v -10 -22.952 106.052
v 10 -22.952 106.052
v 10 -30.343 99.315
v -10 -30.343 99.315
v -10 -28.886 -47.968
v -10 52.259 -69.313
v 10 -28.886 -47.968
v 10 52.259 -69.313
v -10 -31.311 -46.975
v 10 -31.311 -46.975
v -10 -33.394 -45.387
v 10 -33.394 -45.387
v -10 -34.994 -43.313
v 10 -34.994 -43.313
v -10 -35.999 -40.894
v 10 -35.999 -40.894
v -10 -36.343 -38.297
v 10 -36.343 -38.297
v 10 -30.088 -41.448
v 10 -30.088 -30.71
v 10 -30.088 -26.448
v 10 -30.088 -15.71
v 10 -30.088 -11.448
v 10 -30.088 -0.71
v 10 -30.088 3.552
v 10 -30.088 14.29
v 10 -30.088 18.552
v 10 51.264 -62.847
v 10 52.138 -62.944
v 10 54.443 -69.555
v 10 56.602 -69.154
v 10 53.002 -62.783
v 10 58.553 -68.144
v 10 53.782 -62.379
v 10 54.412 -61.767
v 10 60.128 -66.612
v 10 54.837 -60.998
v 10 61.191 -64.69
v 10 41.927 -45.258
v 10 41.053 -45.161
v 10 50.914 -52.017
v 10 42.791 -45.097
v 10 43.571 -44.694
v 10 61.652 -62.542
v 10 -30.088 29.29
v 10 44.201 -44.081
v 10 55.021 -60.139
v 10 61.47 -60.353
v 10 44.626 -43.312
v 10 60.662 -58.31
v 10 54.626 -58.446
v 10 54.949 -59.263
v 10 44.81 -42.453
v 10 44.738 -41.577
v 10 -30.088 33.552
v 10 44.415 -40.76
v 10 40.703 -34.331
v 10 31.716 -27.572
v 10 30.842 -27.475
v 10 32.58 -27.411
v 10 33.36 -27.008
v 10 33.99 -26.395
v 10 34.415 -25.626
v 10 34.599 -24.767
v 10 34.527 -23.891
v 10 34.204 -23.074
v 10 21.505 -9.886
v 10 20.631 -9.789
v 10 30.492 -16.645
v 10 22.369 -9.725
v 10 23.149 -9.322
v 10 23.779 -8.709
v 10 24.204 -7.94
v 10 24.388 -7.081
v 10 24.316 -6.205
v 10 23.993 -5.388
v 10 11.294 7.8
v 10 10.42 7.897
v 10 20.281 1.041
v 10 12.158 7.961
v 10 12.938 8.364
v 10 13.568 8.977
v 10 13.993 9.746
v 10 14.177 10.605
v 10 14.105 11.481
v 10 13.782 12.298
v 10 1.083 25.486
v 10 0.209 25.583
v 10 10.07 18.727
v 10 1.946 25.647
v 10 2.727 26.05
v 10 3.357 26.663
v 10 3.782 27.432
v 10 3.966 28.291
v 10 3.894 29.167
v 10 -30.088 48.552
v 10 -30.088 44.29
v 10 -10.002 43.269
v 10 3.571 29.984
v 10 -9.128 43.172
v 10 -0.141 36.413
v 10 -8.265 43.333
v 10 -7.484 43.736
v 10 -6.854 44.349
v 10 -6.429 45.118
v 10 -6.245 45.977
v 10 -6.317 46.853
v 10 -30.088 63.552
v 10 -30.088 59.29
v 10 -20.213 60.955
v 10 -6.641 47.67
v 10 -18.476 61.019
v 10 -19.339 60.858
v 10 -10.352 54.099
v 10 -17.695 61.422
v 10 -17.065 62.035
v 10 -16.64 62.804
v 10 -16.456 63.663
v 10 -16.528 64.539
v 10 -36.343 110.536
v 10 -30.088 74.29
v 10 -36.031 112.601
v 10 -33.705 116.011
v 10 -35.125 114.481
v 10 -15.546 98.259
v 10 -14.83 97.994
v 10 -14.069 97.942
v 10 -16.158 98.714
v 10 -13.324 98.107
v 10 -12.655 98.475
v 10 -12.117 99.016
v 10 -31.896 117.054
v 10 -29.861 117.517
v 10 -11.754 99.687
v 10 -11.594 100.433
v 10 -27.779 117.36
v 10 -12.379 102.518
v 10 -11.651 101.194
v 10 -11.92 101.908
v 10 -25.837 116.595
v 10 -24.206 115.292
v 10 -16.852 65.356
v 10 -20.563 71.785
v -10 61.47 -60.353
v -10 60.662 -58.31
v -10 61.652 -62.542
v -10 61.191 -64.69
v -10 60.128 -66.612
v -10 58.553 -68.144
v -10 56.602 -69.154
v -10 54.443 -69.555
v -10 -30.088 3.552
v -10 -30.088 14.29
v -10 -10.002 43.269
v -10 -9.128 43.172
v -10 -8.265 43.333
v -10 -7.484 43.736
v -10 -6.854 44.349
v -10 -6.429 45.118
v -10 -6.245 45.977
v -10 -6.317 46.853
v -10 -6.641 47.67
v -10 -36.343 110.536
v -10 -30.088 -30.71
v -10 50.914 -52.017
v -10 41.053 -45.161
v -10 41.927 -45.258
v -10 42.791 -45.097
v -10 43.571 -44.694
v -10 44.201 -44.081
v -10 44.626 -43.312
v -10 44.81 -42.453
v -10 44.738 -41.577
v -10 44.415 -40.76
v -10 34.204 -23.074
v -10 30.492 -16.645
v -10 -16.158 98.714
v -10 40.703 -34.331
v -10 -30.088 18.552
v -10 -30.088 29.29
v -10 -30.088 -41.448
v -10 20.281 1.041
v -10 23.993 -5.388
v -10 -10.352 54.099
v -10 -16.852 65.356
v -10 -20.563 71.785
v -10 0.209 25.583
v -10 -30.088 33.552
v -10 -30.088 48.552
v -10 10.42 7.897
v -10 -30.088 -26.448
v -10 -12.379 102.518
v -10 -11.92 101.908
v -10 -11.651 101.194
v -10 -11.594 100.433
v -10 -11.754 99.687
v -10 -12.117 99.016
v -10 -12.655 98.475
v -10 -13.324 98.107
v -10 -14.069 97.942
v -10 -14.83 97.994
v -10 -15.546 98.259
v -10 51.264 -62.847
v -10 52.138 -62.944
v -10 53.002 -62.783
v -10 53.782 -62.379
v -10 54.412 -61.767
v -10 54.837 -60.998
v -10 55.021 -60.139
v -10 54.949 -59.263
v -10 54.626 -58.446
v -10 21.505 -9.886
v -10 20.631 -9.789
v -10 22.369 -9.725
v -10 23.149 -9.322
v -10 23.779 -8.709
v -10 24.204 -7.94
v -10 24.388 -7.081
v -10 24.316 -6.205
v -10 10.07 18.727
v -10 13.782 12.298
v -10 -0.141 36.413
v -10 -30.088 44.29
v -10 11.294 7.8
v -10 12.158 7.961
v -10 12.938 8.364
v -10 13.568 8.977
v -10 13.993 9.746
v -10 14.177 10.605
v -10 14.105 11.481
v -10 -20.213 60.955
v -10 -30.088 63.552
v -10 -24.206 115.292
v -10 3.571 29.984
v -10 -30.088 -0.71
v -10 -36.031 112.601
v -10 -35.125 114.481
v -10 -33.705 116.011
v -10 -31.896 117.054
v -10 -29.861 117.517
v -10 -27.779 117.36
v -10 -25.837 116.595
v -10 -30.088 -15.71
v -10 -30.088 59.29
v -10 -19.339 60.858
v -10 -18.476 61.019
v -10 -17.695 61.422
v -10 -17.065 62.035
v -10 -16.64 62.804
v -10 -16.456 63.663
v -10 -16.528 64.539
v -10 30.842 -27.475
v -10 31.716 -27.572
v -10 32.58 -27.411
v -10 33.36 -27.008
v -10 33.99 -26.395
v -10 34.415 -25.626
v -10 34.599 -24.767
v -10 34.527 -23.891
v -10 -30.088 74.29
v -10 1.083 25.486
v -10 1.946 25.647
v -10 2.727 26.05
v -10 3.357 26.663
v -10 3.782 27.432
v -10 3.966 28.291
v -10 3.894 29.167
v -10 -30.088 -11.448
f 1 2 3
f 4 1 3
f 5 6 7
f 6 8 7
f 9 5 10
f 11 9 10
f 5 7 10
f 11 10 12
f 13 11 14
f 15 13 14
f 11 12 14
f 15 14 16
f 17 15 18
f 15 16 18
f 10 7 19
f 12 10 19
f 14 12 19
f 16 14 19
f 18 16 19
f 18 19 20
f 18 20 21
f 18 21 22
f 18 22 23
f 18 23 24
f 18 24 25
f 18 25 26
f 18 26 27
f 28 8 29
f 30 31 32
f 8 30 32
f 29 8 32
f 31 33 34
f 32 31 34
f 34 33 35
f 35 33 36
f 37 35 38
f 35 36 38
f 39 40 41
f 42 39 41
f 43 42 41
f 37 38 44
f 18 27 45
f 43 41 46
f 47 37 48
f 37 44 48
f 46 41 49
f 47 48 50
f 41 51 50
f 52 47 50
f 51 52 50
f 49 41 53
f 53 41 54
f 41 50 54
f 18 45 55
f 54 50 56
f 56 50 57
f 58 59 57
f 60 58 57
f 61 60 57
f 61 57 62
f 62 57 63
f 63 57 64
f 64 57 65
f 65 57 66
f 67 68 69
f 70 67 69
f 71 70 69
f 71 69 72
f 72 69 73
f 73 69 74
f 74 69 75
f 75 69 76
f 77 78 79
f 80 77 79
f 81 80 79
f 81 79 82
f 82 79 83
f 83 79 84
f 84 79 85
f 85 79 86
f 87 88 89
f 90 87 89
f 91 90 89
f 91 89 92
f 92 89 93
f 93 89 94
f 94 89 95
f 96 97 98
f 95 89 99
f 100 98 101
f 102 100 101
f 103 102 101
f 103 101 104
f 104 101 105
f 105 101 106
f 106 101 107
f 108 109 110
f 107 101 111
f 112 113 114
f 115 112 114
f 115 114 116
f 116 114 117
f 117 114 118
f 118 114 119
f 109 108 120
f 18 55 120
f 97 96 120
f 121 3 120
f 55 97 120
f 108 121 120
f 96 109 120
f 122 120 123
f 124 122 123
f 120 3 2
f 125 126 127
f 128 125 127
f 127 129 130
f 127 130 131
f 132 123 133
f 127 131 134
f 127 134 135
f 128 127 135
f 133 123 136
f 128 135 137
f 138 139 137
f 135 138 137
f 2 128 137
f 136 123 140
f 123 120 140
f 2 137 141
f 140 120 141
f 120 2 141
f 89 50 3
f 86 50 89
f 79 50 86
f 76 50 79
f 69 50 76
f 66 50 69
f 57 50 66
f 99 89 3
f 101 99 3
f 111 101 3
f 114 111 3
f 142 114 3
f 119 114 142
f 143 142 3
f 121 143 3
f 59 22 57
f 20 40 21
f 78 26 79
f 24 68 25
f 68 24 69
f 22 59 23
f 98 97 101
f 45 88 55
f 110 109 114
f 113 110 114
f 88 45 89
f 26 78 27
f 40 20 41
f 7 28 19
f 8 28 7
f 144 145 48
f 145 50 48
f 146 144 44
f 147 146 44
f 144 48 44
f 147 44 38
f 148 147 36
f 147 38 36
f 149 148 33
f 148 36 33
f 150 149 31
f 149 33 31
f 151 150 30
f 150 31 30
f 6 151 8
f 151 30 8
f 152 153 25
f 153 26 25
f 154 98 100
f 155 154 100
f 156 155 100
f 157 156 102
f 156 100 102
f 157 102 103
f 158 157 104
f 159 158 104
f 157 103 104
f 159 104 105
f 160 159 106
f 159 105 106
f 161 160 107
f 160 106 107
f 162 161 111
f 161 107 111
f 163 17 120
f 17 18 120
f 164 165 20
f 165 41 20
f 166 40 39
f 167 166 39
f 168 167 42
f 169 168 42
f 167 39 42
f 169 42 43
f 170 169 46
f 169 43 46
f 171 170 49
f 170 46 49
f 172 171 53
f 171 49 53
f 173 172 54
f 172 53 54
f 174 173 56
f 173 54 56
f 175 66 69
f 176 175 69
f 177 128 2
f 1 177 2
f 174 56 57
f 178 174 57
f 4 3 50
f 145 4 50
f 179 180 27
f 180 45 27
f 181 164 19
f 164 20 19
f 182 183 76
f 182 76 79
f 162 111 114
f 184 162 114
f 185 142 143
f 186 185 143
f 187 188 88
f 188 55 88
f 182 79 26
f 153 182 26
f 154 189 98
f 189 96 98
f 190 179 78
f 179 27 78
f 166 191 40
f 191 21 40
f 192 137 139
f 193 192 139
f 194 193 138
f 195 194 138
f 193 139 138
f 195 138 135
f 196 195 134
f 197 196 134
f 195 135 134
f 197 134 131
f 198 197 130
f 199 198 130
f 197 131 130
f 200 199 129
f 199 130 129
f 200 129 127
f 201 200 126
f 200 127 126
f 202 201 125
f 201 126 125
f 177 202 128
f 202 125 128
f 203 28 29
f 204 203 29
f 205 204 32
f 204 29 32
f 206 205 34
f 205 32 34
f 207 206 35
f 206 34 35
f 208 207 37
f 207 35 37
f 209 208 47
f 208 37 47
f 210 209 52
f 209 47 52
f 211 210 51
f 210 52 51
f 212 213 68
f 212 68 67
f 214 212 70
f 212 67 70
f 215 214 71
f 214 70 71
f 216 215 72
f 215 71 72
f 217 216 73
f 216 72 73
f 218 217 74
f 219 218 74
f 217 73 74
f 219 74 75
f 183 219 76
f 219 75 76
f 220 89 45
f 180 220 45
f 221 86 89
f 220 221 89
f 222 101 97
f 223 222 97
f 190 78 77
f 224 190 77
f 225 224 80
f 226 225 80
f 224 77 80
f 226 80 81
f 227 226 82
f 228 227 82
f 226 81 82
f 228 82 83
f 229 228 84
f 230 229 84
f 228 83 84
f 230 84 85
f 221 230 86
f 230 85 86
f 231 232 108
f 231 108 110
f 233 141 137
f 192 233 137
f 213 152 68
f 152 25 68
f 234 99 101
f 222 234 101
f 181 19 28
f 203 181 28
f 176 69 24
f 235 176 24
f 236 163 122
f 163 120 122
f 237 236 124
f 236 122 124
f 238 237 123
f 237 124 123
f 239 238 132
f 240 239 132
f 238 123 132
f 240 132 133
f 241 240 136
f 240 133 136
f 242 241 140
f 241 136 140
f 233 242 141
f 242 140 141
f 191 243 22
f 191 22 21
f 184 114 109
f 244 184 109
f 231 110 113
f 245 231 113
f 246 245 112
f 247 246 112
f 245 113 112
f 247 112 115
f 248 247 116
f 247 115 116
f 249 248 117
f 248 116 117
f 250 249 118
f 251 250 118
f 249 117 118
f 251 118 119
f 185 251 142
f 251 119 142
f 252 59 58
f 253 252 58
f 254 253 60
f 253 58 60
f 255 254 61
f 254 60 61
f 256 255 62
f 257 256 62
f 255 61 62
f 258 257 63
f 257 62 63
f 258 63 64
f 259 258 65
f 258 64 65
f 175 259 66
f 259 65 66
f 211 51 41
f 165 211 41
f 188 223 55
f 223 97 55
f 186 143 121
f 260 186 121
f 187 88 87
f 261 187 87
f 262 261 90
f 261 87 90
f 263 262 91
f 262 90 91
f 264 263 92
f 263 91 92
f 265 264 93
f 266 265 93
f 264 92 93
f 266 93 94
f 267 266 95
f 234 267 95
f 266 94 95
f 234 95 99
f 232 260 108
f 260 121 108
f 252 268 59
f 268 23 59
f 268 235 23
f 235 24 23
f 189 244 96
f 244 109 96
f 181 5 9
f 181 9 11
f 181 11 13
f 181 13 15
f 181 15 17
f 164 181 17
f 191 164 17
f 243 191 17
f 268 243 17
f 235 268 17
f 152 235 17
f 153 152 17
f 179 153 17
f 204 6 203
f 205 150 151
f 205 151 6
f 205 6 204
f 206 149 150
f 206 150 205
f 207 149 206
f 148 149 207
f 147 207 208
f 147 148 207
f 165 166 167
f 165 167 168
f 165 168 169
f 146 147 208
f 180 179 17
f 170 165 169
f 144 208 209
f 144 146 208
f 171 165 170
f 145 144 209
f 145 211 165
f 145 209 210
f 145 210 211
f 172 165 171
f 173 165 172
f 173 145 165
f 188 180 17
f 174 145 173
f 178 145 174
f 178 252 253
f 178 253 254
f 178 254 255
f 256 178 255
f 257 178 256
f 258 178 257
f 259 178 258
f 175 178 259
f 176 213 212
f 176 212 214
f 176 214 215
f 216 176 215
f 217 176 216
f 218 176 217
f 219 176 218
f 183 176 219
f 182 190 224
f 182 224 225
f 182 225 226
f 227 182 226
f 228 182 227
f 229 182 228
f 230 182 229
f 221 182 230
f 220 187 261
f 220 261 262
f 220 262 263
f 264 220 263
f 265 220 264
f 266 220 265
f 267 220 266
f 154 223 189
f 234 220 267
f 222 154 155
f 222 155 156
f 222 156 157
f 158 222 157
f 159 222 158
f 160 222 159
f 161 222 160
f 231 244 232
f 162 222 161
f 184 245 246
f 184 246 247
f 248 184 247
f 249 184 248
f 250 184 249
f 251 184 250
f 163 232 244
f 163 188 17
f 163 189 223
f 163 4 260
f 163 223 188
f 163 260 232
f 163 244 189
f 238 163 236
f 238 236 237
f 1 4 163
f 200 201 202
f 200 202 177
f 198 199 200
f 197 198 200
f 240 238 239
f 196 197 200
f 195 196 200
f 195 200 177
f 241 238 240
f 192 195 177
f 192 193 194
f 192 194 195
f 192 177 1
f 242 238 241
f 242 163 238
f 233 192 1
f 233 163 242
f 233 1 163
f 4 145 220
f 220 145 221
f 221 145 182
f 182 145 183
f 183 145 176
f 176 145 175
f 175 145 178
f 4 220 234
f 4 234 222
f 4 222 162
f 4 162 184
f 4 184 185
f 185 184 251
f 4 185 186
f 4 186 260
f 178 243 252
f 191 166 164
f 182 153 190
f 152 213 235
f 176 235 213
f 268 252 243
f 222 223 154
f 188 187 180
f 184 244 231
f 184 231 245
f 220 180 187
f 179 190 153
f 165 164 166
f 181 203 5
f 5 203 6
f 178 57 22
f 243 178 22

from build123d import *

# Parameters (mm, degrees)
BOSS_EXTRUDE1_DEPTH = 10


with BuildPart() as part:
    # Sketch1 → Boss-Extrude1 (new, symmetric)
    with BuildSketch(Plane(origin=(0, 0, 0), x_dir=(0, 0, -1), z_dir=(1, 0, 0))):
        with BuildLine():
            Line((-99.315402363, -30.342537444), (58.309854952, 60.662447298))
            ThreePointArc((58.309854952, 60.662447298), (66.611935212, 60.127841079), (69.313108369, 52.259295849))
            Line((69.313108369, 52.259295849), (47.967793309, -28.886485338))
            ThreePointArc((47.967793309, -28.886485338), (44.402545097, -34.262116945), (38.296788753, -36.342537444))
            Line((38.296788753, -36.342537444), (-110.536380347, -36.342537444))
            ThreePointArc((-110.536380347, -36.342537444), (-117.053891299, -31.896368093), (-115.29198584, -24.205980582))
            Line((-115.29198584, -24.205980582), (-102.51761164, -12.379014435))
            ThreePointArc((-102.51761164, -12.379014435), (-98.726134685, -12.366723669), (-98.713843919, -16.158200625))
            Line((-98.713843919, -16.158200625), (-106.051782293, -22.951922758))
            Line((-106.051782293, -22.951922758), (-99.315402363, -30.342537444))
        make_face()
        with BuildLine():
            Line((52.017451593, 50.914073792), (30.709901091, -30.088142654))
            Line((30.709901091, -30.088142654), (41.447586102, -30.088142654))
            Line((41.447586102, -30.088142654), (62.847268014, 51.26431811))
            ThreePointArc((62.847268014, 51.26431811), (61.766798752, 54.411736202), (58.445966648, 54.62557869))
            Line((58.445966648, 54.62557869), (52.017451593, 50.914073792))
        make_face(mode=Mode.SUBTRACT)
        with BuildLine():
            Line((15.709901091, -30.088142654), (26.447586102, -30.088142654))
            Line((26.447586102, -30.088142654), (45.161270866, 41.053302896))
            ThreePointArc((45.161270866, 41.053302896), (44.080801604, 44.200720988), (40.7599695, 44.414563475))
            Line((40.7599695, 44.414563475), (34.331454445, 40.703058578))
            Line((34.331454445, 40.703058578), (15.709901091, -30.088142654))
        make_face(mode=Mode.SUBTRACT)
        with BuildLine():
            Line((0.709901092, -30.088142654), (11.447586102, -30.088142654))
            Line((11.447586102, -30.088142654), (27.475273718, 30.842287682))
            ThreePointArc((27.475273718, 30.842287682), (26.394804456, 33.989705774), (23.073972352, 34.203548261))
            Line((23.073972352, 34.203548261), (16.645457297, 30.492043364))
            Line((16.645457297, 30.492043364), (0.709901092, -30.088142654))
        make_face(mode=Mode.SUBTRACT)
        with BuildLine():
            Line((-14.290098908, -30.088142654), (-3.552413898, -30.088142654))
            Line((-3.552413898, -30.088142654), (9.789276571, 20.631272467))
            ThreePointArc((9.789276571, 20.631272467), (8.708807308, 23.778690559), (5.387975204, 23.992533047))
            Line((5.387975204, 23.992533047), (-1.040539851, 20.28102815))
            Line((-1.040539851, 20.28102815), (-14.290098908, -30.088142654))
        make_face(mode=Mode.SUBTRACT)
        with BuildLine():
            Line((-29.290098908, -30.088142654), (-18.552413898, -30.088142654))
            Line((-18.552413898, -30.088142654), (-7.896720577, 10.420257253))
            ThreePointArc((-7.896720577, 10.420257253), (-8.97718984, 13.567675345), (-12.298021944, 13.781517833))
            Line((-12.298021944, 13.781517833), (-18.726536999, 10.070012936))
            Line((-18.726536999, 10.070012936), (-29.290098908, -30.088142654))
        make_face(mode=Mode.SUBTRACT)
        with BuildLine():
            Line((-44.290098908, -30.088142654), (-33.552413898, -30.088142654))
            Line((-33.552413898, -30.088142654), (-25.582717725, 0.209242039))
            ThreePointArc((-25.582717725, 0.209242039), (-26.663186988, 3.356660131), (-29.984019092, 3.570502619))
            Line((-29.984019092, 3.570502619), (-36.412534146, -0.141002279))
            Line((-36.412534146, -0.141002279), (-44.290098908, -30.088142654))
        make_face(mode=Mode.SUBTRACT)
        with BuildLine():
            Line((-59.290098908, -30.088142654), (-48.552413898, -30.088142654))
            Line((-48.552413898, -30.088142654), (-43.268714873, -10.001773175))
            ThreePointArc((-43.268714873, -10.001773175), (-44.349184136, -6.854355083), (-47.67001624, -6.640512596))
            Line((-47.67001624, -6.640512596), (-54.098531294, -10.352017493))
            Line((-54.098531294, -10.352017493), (-59.290098908, -30.088142654))
        make_face(mode=Mode.SUBTRACT)
        with BuildLine():
            Line((-74.290098908, -30.088142654), (-63.552413898, -30.088142654))
            Line((-63.552413898, -30.088142654), (-60.954712021, -20.212788389))
            ThreePointArc((-60.954712021, -20.212788389), (-62.035181283, -17.065370297), (-65.356013388, -16.85152781))
            Line((-65.356013388, -16.85152781), (-71.784528442, -20.563032707))
            Line((-71.784528442, -20.563032707), (-74.290098908, -30.088142654))
        make_face(mode=Mode.SUBTRACT)
    extrude(amount=BOSS_EXTRUDE1_DEPTH, both=True)


solid = part.part
